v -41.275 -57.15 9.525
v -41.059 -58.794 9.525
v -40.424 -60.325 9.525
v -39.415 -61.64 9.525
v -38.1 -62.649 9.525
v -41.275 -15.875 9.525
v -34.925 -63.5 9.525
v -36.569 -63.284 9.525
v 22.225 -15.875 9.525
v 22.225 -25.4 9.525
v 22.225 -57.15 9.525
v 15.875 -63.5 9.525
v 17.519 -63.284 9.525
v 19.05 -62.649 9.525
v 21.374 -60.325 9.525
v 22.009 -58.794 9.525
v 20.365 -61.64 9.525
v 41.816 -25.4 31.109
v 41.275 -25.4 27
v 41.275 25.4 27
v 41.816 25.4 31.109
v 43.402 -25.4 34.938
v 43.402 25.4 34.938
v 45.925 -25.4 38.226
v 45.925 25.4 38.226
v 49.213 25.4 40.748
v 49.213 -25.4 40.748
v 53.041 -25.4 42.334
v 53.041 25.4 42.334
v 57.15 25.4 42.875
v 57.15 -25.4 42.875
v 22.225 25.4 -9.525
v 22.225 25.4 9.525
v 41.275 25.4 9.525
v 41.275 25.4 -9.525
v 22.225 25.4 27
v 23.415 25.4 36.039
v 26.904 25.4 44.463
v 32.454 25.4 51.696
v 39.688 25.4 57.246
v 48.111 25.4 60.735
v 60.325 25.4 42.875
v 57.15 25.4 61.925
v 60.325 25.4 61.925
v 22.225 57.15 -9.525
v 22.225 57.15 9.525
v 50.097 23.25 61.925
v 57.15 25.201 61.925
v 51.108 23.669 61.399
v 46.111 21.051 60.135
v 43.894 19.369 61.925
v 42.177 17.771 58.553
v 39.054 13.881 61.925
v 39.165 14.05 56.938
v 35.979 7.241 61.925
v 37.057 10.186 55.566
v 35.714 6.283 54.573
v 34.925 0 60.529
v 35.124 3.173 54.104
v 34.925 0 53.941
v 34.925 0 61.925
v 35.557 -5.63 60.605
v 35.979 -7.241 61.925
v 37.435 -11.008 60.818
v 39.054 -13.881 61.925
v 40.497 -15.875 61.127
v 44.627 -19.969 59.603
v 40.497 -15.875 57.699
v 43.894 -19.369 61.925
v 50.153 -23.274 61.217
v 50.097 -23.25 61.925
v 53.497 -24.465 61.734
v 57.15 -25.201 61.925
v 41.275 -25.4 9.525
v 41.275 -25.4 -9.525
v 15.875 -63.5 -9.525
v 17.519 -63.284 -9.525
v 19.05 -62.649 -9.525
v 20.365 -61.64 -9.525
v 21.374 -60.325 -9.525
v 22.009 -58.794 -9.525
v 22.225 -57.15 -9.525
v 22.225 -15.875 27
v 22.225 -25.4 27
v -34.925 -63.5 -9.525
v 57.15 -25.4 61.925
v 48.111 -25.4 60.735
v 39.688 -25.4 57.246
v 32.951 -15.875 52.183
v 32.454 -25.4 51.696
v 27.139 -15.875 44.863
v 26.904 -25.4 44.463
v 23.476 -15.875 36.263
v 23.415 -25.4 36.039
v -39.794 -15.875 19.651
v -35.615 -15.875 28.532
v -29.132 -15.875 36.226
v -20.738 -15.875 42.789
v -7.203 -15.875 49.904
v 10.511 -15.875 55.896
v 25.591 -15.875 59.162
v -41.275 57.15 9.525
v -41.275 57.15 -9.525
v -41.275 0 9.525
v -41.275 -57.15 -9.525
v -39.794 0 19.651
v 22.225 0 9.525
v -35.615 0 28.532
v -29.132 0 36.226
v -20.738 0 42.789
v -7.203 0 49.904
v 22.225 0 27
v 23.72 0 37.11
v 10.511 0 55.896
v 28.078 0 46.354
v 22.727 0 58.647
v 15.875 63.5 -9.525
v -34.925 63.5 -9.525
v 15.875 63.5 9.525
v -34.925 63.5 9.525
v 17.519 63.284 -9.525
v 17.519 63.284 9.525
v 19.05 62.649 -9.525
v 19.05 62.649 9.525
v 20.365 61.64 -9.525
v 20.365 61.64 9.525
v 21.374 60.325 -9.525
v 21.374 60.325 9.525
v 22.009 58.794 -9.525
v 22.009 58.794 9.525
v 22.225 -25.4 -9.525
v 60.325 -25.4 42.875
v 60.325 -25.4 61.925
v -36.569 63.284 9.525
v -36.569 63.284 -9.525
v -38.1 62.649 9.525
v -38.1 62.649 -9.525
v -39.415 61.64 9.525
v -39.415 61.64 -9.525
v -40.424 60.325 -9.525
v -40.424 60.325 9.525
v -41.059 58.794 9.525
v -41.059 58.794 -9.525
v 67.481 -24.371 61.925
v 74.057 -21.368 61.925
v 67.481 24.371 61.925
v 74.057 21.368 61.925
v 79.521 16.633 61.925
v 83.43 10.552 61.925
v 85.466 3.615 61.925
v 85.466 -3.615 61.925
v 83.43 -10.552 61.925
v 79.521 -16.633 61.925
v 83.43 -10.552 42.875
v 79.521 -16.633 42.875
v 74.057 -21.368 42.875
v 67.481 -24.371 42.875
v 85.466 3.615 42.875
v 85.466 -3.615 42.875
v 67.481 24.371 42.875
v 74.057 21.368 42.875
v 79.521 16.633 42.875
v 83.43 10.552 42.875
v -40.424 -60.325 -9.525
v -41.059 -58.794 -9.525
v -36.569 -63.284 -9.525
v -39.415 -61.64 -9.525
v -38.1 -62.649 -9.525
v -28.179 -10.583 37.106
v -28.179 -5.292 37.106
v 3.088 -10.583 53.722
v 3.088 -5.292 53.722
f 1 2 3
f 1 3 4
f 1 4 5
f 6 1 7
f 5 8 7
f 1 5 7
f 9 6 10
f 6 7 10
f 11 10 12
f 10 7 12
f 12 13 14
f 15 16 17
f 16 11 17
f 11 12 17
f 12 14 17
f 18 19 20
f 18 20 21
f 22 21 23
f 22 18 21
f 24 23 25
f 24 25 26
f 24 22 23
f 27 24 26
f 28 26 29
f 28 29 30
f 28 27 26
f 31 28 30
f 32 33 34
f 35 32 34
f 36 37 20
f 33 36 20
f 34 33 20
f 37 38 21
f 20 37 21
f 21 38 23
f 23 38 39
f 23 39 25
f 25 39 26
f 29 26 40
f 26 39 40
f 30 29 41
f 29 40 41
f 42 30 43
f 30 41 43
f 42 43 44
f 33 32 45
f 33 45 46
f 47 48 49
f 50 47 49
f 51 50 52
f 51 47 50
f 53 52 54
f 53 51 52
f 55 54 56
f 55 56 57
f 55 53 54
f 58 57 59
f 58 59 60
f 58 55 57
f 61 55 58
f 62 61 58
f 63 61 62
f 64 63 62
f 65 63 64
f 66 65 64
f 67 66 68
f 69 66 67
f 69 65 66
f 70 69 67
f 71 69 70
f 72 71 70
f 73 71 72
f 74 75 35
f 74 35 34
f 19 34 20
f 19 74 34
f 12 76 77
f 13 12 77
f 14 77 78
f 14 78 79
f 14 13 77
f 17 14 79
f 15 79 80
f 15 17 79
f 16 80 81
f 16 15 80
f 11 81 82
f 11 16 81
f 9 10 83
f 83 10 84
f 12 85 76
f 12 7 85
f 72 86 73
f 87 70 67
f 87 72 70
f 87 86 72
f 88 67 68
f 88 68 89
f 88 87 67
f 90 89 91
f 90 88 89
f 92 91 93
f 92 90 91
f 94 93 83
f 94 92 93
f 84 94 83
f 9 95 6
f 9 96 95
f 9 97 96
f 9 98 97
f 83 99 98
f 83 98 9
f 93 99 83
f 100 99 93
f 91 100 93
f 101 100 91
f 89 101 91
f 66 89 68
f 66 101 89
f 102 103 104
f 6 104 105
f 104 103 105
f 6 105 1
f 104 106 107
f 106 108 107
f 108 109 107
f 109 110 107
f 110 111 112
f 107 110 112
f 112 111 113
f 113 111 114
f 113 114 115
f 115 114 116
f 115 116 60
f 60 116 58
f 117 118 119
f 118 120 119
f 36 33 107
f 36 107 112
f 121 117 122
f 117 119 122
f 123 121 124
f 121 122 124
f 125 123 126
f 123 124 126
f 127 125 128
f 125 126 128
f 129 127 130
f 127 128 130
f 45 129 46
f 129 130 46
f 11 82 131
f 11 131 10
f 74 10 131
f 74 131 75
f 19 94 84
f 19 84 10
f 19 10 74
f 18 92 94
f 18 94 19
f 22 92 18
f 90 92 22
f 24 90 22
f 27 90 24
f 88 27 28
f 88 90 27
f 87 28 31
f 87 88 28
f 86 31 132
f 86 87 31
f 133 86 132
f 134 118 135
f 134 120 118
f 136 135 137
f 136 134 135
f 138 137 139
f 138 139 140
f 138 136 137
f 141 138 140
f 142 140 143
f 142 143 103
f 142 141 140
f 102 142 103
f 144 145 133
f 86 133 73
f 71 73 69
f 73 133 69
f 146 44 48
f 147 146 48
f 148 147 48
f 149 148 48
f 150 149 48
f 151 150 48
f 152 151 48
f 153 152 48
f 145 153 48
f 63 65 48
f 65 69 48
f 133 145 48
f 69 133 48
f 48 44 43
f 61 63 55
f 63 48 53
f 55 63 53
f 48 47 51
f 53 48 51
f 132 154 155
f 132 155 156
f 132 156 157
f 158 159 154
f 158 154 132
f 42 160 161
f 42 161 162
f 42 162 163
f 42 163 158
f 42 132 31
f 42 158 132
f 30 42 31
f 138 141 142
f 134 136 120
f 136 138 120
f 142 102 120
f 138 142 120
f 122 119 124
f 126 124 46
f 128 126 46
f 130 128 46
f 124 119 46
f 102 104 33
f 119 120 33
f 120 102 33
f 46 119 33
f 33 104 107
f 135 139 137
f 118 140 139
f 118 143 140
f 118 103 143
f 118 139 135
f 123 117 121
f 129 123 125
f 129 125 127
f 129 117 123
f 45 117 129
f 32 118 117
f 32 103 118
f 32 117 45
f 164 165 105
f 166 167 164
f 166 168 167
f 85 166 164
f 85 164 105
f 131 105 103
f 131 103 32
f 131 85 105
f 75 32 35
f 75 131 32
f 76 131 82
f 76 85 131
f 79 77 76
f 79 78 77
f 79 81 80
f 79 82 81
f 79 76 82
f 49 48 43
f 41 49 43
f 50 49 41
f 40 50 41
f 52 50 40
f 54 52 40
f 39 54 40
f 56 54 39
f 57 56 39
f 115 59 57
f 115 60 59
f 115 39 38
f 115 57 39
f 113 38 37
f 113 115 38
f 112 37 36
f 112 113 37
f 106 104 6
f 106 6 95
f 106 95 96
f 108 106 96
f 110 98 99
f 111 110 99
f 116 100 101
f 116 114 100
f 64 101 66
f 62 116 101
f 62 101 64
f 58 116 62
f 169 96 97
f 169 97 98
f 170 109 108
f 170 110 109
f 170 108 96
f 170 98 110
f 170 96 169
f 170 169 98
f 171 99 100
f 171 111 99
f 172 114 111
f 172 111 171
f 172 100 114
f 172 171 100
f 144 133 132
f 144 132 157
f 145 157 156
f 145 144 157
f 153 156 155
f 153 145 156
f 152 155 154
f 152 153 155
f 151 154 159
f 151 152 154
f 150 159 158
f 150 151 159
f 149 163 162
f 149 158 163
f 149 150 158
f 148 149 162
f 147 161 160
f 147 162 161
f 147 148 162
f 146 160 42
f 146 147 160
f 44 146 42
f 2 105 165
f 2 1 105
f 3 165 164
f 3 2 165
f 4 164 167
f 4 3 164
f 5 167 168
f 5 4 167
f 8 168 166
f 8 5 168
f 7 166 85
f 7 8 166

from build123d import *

# Parameters (mm, degrees)
F0_W     = 63.5000000107
F0_H     = 19.05
F1_DEPTH = 63.5
F0_W_2   = 19.0499999893
F2_DEPTH = 25.4
F3_DEPTH = 15.875
F0_W_3   = 25.4
F0_H_2   = 19.0499999893
F5_R     = 6.35


with BuildPart() as f1:
    # F0 (on Front) → F1 (new body, symmetric)
    with BuildSketch(Plane.XZ):
        with Locations((-9.5249999946, 0)):
            Rectangle(F0_W, F0_H)
    extrude(amount=F1_DEPTH, both=True)

    # F0 (on Front) → F2 (join, symmetric)
    with BuildSketch(Plane.XZ):
        with Locations((31.7500000054, 0)):
            Rectangle(F0_W_2, F0_H)
        with BuildLine():
            Line((22.2250000107, 9.525), (41.275, 9.525))
            Line((41.275, 9.525), (41.275, 27.0002))
            ThreePointArc((41.275, 27.0002), (45.9246798487, 38.2255201513), (57.15, 42.8752))
            Line((57.15, 42.8752), (60.325, 42.8752))
            Line((60.325, 42.8752), (60.325, 61.9251999893))
            Line((60.325, 61.9251999893), (57.1730846286, 61.9251999893))
            Line((57.1730846286, 61.9251999893), (57.15, 61.9251999893))
            ThreePointArc((57.15, 61.9251999893), (32.4542956746, 51.6959043254), (22.2250000107, 27.0002))
            Line((22.2250000107, 27.0002), (22.2250000107, 9.525))
        make_face()
    extrude(amount=F2_DEPTH, both=True)

    # F0 (on Front) → F3 (join)
    with BuildSketch(Plane.XZ):
        with BuildLine():
            Line((-41.275, 9.525), (22.2250000107, 9.525))
            Line((22.2250000107, 9.525), (22.2250000107, 27.0002))
            ThreePointArc((22.2250000107, 27.0002), (32.4542956746, 51.6959043254), (57.15, 61.9251999893))
            add(Edge.make_bspline(
                [(-41.275, 9.525), (-41.275, 48.5757485088), (19.736442486, 61.9251999893), (57.15, 61.9251999893)],
                knots=[0, 0, 0, 0, 111.5045361585, 111.5045361585, 111.5045361585, 111.5045361585], degree=3))
        make_face()
    extrude(amount=F3_DEPTH)

    # F0 (on Front) → F4 (revolve)
    with BuildSketch(Plane.XZ):
        with Locations((73.025, 52.4001999946)):
            Rectangle(F0_W_3, F0_H_2)
    revolve(axis=Axis((60.325, 0, 52.3875), (0, 0, 1)))

    # F5
    f5_edges = [f1.edges().sort_by_distance(p)[0] for p in [
        (-41.275, -63.5, 0),
        (22.225, -63.5, 0),
        (-41.275, 63.5, 0),
        (22.225, 63.5, 0),
    ]]
    fillet(f5_edges, radius=F5_R)


solid = f1.part
